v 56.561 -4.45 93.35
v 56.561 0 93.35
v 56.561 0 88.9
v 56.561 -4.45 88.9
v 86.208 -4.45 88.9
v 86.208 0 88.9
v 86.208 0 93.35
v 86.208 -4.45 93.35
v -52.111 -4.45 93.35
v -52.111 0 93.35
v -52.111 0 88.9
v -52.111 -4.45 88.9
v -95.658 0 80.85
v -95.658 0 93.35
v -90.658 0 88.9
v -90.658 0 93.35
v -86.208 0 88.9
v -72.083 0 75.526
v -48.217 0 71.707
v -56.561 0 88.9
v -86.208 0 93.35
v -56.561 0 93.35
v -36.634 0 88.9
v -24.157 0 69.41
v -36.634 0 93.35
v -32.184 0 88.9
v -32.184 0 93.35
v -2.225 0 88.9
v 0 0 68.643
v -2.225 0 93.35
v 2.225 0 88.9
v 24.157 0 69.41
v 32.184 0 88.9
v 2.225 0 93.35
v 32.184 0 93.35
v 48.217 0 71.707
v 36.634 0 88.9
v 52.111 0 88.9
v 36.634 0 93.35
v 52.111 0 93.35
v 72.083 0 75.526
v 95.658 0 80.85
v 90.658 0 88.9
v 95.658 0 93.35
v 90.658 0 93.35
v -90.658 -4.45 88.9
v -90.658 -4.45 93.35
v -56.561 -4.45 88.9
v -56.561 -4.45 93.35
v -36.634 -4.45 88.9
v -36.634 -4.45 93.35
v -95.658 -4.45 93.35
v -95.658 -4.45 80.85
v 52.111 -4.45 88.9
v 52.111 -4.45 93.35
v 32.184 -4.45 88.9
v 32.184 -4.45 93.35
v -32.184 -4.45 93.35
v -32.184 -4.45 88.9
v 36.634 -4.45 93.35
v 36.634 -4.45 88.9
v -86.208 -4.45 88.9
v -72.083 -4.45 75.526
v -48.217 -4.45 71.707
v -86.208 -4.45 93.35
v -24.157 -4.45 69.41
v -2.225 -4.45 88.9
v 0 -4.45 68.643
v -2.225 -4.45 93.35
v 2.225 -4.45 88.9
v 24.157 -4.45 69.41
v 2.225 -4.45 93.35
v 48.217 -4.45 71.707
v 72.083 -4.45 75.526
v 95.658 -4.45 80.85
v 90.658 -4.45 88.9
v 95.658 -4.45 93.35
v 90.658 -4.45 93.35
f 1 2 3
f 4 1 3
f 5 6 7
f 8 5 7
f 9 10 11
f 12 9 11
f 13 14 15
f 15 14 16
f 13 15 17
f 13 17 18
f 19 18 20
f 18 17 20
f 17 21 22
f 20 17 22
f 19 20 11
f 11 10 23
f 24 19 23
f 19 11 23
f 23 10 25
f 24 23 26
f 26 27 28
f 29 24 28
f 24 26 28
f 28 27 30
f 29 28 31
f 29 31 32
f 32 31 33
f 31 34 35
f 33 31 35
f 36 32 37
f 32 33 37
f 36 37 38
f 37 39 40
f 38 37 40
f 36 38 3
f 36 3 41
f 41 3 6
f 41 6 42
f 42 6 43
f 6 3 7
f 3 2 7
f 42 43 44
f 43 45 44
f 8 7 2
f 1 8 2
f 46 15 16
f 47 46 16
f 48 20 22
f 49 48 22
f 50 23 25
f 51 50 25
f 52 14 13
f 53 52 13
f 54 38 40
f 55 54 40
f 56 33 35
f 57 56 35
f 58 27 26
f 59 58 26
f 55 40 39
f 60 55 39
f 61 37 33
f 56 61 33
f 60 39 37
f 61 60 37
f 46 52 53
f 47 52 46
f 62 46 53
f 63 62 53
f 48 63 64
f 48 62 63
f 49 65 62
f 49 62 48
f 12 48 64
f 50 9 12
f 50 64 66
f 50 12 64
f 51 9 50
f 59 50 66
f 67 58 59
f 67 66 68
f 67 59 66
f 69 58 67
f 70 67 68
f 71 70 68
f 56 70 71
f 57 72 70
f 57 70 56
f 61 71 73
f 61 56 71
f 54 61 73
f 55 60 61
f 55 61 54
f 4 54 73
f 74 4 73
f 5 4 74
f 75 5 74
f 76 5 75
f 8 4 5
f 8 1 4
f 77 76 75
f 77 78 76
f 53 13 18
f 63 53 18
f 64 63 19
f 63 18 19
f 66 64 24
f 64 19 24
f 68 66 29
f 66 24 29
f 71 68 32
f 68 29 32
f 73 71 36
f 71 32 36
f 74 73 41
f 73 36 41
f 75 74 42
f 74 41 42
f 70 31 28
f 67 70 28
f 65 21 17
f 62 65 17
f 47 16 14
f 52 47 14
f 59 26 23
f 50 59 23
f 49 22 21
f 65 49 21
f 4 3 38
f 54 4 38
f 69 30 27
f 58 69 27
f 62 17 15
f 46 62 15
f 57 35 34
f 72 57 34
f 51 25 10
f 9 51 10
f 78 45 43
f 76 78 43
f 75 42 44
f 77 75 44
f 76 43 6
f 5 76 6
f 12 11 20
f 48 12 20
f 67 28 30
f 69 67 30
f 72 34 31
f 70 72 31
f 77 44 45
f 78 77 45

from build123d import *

# Parameters (mm, degrees)
F1_DEPTH = 4.45


# Not quite as in the source:
# - ends of sketch curves that miss each other by under 0.0002 mm in the source are joined


with BuildPart() as f1:
    # F0 (on Front) → F1 (new body)
    with BuildSketch(Plane.XZ):
        with BuildLine():
            Line((2.225, 93.35), (2.225, 88.9))
            Line((2.225, 88.9), (-2.225, 88.9))
            Line((-2.225, 88.9), (-2.225, 93.35))
            Line((-2.225, 93.35), (-32.1837038577, 93.35))
            Line((-32.1837038577, 93.35), (-32.1837038577, 88.9))
            Line((-32.1837038577, 88.9), (-36.6337038577, 88.9))
            Line((-36.6337038577, 88.9), (-36.6337038577, 93.35))
            Line((-36.6337038577, 93.35), (-52.1105349839, 93.35))
            Line((-52.1105349839, 93.35), (-52.1105349839, 88.9))
            Line((-52.1105349839, 88.9), (-56.5605349839, 88.9))
            Line((-56.5605349839, 88.9), (-56.5605349839, 93.35))
            Line((-56.5605349839, 93.35), (-86.2080463052, 93.35))
            Line((-86.2080463052, 93.35), (-86.2080463052, 88.9))
            Line((-86.2080463052, 88.9), (-90.6580463052, 88.9))
            Line((-90.6580463052, 88.9), (-90.6580463052, 93.35))
            Line((-90.6580463052, 93.35), (-95.6580463052, 93.35))
            Line((-95.6580463052, 93.35), (-95.6580463052, 80.85))
            ThreePointArc((-95.6580463052, 80.85), (0, 68.6427723395), (95.6580463052, 80.85))
            Line((95.6580463052, 80.85), (95.6580463052, 93.35))
            Line((95.6580463052, 93.35), (90.6580463052, 93.35))
            Line((90.6580463052, 93.35), (90.6580454826, 88.9))
            Line((90.6580454826, 88.9), (86.2080454826, 88.9))
            Line((86.2080454826, 88.9), (86.2080454826, 93.35))
            Line((86.2080454826, 93.35), (56.5605341613, 93.35))
            Line((56.5605341613, 93.35), (56.5605341613, 88.9))
            Line((56.5605341613, 88.9), (52.1105341613, 88.9))
            Line((52.1105341613, 88.9), (52.1105341613, 93.35))
            Line((52.1105341613, 93.35), (36.6337030351, 93.35))
            Line((36.6337030351, 93.35), (36.6337030351, 88.9))
            Line((36.6337030351, 88.9), (32.1837030351, 88.9))
            Line((32.1837030351, 88.9), (32.1837030351, 93.35))
            Line((32.1837030351, 93.35), (2.225, 93.35))
        make_face()
    extrude(amount=F1_DEPTH)


solid = f1.part
